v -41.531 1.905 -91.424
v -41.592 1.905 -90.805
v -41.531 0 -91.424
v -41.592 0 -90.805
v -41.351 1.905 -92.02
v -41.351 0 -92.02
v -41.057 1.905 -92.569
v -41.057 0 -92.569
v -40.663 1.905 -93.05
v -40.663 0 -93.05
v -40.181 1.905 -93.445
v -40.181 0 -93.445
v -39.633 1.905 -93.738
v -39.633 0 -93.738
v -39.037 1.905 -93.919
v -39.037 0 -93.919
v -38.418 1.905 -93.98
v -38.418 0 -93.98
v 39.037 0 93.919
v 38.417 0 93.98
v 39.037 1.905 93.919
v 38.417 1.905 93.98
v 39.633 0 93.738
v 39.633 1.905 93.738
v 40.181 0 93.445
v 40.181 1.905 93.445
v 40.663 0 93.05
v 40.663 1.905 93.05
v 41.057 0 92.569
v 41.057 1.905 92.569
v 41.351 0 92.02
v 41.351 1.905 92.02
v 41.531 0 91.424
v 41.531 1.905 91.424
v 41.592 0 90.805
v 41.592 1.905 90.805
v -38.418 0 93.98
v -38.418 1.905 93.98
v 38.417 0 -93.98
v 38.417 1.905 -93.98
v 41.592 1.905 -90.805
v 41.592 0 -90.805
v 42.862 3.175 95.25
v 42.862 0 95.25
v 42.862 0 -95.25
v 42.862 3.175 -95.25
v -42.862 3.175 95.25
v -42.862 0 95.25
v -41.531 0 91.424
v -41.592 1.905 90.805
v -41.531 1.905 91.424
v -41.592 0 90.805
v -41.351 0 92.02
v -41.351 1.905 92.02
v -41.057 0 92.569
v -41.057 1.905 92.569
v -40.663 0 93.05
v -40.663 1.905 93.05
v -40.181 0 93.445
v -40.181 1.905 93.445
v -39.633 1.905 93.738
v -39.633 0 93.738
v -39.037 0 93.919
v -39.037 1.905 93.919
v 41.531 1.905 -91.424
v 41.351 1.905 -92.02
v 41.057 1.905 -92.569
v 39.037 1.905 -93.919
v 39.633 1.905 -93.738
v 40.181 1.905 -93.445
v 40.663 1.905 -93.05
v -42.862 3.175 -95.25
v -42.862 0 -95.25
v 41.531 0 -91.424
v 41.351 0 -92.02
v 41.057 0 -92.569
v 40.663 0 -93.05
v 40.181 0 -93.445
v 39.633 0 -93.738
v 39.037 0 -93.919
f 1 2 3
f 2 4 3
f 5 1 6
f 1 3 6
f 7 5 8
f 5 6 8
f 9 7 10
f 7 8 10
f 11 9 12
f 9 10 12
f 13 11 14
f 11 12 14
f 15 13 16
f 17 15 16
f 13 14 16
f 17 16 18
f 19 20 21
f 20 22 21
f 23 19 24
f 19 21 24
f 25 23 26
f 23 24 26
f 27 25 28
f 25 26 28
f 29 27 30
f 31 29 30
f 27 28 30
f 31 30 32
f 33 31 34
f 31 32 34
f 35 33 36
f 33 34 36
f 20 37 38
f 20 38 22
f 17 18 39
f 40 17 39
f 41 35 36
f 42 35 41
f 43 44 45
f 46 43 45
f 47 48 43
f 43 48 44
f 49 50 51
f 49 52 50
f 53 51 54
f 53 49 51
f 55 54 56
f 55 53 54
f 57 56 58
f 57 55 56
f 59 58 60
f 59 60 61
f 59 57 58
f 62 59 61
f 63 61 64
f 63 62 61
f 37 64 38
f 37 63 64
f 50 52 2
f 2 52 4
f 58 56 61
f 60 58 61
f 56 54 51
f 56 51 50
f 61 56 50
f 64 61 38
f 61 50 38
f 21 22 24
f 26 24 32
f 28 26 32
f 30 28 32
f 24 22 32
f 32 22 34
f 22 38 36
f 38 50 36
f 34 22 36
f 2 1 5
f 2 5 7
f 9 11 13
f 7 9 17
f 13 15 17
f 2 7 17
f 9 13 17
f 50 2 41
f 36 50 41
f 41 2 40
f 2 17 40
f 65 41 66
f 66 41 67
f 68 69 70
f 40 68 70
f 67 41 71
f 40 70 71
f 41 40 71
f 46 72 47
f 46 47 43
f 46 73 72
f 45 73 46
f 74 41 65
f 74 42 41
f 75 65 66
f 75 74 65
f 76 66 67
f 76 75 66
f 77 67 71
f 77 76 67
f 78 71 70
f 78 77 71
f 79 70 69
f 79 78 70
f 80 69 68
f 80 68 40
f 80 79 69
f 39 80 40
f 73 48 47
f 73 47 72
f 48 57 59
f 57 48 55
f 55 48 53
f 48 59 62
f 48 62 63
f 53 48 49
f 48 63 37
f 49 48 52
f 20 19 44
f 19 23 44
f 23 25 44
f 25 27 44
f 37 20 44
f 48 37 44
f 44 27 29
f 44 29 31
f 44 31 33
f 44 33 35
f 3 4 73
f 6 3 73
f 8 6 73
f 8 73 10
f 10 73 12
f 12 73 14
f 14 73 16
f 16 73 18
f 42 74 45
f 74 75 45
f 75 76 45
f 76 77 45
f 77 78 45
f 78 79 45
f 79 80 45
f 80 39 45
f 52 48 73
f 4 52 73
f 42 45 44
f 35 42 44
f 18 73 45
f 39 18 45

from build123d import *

# Parameters (mm, degrees)
SKETCH1_W           = 85.725
SKETCH1_H           = 190.5
BOSS_EXTRUDE1_DEPTH = 3.175
SHELL1_T            = -1.27
FILLET1_R           = 3.175


with BuildPart() as part:
    # Sketch1 → Boss-Extrude1 (new body)
    with BuildSketch(Plane(origin=(0, 0, 0), x_dir=(1, 0, 0), z_dir=(0, 1, 0))):
        Rectangle(SKETCH1_W, SKETCH1_H)
    extrude(amount=BOSS_EXTRUDE1_DEPTH)

    # Shell1
    shell1_openings = [part.faces().sort_by_distance(p)[0] for p in [
        (0, 0, 0),
    ]]
    offset(amount=SHELL1_T, openings=shell1_openings, kind=Kind.INTERSECTION)

    # Fillet1
    fillet1_edges = [part.edges().sort_by_distance(p)[0] for p in [
        (-41.5925, 0.9525, -93.98),
        (-41.5925, 0.9525, 93.98),
        (41.5925, 0.9525, 93.98),
        (41.5925, 0.9525, -93.98),
    ]]
    fillet(fillet1_edges, radius=FILLET1_R)


solid = part.part
